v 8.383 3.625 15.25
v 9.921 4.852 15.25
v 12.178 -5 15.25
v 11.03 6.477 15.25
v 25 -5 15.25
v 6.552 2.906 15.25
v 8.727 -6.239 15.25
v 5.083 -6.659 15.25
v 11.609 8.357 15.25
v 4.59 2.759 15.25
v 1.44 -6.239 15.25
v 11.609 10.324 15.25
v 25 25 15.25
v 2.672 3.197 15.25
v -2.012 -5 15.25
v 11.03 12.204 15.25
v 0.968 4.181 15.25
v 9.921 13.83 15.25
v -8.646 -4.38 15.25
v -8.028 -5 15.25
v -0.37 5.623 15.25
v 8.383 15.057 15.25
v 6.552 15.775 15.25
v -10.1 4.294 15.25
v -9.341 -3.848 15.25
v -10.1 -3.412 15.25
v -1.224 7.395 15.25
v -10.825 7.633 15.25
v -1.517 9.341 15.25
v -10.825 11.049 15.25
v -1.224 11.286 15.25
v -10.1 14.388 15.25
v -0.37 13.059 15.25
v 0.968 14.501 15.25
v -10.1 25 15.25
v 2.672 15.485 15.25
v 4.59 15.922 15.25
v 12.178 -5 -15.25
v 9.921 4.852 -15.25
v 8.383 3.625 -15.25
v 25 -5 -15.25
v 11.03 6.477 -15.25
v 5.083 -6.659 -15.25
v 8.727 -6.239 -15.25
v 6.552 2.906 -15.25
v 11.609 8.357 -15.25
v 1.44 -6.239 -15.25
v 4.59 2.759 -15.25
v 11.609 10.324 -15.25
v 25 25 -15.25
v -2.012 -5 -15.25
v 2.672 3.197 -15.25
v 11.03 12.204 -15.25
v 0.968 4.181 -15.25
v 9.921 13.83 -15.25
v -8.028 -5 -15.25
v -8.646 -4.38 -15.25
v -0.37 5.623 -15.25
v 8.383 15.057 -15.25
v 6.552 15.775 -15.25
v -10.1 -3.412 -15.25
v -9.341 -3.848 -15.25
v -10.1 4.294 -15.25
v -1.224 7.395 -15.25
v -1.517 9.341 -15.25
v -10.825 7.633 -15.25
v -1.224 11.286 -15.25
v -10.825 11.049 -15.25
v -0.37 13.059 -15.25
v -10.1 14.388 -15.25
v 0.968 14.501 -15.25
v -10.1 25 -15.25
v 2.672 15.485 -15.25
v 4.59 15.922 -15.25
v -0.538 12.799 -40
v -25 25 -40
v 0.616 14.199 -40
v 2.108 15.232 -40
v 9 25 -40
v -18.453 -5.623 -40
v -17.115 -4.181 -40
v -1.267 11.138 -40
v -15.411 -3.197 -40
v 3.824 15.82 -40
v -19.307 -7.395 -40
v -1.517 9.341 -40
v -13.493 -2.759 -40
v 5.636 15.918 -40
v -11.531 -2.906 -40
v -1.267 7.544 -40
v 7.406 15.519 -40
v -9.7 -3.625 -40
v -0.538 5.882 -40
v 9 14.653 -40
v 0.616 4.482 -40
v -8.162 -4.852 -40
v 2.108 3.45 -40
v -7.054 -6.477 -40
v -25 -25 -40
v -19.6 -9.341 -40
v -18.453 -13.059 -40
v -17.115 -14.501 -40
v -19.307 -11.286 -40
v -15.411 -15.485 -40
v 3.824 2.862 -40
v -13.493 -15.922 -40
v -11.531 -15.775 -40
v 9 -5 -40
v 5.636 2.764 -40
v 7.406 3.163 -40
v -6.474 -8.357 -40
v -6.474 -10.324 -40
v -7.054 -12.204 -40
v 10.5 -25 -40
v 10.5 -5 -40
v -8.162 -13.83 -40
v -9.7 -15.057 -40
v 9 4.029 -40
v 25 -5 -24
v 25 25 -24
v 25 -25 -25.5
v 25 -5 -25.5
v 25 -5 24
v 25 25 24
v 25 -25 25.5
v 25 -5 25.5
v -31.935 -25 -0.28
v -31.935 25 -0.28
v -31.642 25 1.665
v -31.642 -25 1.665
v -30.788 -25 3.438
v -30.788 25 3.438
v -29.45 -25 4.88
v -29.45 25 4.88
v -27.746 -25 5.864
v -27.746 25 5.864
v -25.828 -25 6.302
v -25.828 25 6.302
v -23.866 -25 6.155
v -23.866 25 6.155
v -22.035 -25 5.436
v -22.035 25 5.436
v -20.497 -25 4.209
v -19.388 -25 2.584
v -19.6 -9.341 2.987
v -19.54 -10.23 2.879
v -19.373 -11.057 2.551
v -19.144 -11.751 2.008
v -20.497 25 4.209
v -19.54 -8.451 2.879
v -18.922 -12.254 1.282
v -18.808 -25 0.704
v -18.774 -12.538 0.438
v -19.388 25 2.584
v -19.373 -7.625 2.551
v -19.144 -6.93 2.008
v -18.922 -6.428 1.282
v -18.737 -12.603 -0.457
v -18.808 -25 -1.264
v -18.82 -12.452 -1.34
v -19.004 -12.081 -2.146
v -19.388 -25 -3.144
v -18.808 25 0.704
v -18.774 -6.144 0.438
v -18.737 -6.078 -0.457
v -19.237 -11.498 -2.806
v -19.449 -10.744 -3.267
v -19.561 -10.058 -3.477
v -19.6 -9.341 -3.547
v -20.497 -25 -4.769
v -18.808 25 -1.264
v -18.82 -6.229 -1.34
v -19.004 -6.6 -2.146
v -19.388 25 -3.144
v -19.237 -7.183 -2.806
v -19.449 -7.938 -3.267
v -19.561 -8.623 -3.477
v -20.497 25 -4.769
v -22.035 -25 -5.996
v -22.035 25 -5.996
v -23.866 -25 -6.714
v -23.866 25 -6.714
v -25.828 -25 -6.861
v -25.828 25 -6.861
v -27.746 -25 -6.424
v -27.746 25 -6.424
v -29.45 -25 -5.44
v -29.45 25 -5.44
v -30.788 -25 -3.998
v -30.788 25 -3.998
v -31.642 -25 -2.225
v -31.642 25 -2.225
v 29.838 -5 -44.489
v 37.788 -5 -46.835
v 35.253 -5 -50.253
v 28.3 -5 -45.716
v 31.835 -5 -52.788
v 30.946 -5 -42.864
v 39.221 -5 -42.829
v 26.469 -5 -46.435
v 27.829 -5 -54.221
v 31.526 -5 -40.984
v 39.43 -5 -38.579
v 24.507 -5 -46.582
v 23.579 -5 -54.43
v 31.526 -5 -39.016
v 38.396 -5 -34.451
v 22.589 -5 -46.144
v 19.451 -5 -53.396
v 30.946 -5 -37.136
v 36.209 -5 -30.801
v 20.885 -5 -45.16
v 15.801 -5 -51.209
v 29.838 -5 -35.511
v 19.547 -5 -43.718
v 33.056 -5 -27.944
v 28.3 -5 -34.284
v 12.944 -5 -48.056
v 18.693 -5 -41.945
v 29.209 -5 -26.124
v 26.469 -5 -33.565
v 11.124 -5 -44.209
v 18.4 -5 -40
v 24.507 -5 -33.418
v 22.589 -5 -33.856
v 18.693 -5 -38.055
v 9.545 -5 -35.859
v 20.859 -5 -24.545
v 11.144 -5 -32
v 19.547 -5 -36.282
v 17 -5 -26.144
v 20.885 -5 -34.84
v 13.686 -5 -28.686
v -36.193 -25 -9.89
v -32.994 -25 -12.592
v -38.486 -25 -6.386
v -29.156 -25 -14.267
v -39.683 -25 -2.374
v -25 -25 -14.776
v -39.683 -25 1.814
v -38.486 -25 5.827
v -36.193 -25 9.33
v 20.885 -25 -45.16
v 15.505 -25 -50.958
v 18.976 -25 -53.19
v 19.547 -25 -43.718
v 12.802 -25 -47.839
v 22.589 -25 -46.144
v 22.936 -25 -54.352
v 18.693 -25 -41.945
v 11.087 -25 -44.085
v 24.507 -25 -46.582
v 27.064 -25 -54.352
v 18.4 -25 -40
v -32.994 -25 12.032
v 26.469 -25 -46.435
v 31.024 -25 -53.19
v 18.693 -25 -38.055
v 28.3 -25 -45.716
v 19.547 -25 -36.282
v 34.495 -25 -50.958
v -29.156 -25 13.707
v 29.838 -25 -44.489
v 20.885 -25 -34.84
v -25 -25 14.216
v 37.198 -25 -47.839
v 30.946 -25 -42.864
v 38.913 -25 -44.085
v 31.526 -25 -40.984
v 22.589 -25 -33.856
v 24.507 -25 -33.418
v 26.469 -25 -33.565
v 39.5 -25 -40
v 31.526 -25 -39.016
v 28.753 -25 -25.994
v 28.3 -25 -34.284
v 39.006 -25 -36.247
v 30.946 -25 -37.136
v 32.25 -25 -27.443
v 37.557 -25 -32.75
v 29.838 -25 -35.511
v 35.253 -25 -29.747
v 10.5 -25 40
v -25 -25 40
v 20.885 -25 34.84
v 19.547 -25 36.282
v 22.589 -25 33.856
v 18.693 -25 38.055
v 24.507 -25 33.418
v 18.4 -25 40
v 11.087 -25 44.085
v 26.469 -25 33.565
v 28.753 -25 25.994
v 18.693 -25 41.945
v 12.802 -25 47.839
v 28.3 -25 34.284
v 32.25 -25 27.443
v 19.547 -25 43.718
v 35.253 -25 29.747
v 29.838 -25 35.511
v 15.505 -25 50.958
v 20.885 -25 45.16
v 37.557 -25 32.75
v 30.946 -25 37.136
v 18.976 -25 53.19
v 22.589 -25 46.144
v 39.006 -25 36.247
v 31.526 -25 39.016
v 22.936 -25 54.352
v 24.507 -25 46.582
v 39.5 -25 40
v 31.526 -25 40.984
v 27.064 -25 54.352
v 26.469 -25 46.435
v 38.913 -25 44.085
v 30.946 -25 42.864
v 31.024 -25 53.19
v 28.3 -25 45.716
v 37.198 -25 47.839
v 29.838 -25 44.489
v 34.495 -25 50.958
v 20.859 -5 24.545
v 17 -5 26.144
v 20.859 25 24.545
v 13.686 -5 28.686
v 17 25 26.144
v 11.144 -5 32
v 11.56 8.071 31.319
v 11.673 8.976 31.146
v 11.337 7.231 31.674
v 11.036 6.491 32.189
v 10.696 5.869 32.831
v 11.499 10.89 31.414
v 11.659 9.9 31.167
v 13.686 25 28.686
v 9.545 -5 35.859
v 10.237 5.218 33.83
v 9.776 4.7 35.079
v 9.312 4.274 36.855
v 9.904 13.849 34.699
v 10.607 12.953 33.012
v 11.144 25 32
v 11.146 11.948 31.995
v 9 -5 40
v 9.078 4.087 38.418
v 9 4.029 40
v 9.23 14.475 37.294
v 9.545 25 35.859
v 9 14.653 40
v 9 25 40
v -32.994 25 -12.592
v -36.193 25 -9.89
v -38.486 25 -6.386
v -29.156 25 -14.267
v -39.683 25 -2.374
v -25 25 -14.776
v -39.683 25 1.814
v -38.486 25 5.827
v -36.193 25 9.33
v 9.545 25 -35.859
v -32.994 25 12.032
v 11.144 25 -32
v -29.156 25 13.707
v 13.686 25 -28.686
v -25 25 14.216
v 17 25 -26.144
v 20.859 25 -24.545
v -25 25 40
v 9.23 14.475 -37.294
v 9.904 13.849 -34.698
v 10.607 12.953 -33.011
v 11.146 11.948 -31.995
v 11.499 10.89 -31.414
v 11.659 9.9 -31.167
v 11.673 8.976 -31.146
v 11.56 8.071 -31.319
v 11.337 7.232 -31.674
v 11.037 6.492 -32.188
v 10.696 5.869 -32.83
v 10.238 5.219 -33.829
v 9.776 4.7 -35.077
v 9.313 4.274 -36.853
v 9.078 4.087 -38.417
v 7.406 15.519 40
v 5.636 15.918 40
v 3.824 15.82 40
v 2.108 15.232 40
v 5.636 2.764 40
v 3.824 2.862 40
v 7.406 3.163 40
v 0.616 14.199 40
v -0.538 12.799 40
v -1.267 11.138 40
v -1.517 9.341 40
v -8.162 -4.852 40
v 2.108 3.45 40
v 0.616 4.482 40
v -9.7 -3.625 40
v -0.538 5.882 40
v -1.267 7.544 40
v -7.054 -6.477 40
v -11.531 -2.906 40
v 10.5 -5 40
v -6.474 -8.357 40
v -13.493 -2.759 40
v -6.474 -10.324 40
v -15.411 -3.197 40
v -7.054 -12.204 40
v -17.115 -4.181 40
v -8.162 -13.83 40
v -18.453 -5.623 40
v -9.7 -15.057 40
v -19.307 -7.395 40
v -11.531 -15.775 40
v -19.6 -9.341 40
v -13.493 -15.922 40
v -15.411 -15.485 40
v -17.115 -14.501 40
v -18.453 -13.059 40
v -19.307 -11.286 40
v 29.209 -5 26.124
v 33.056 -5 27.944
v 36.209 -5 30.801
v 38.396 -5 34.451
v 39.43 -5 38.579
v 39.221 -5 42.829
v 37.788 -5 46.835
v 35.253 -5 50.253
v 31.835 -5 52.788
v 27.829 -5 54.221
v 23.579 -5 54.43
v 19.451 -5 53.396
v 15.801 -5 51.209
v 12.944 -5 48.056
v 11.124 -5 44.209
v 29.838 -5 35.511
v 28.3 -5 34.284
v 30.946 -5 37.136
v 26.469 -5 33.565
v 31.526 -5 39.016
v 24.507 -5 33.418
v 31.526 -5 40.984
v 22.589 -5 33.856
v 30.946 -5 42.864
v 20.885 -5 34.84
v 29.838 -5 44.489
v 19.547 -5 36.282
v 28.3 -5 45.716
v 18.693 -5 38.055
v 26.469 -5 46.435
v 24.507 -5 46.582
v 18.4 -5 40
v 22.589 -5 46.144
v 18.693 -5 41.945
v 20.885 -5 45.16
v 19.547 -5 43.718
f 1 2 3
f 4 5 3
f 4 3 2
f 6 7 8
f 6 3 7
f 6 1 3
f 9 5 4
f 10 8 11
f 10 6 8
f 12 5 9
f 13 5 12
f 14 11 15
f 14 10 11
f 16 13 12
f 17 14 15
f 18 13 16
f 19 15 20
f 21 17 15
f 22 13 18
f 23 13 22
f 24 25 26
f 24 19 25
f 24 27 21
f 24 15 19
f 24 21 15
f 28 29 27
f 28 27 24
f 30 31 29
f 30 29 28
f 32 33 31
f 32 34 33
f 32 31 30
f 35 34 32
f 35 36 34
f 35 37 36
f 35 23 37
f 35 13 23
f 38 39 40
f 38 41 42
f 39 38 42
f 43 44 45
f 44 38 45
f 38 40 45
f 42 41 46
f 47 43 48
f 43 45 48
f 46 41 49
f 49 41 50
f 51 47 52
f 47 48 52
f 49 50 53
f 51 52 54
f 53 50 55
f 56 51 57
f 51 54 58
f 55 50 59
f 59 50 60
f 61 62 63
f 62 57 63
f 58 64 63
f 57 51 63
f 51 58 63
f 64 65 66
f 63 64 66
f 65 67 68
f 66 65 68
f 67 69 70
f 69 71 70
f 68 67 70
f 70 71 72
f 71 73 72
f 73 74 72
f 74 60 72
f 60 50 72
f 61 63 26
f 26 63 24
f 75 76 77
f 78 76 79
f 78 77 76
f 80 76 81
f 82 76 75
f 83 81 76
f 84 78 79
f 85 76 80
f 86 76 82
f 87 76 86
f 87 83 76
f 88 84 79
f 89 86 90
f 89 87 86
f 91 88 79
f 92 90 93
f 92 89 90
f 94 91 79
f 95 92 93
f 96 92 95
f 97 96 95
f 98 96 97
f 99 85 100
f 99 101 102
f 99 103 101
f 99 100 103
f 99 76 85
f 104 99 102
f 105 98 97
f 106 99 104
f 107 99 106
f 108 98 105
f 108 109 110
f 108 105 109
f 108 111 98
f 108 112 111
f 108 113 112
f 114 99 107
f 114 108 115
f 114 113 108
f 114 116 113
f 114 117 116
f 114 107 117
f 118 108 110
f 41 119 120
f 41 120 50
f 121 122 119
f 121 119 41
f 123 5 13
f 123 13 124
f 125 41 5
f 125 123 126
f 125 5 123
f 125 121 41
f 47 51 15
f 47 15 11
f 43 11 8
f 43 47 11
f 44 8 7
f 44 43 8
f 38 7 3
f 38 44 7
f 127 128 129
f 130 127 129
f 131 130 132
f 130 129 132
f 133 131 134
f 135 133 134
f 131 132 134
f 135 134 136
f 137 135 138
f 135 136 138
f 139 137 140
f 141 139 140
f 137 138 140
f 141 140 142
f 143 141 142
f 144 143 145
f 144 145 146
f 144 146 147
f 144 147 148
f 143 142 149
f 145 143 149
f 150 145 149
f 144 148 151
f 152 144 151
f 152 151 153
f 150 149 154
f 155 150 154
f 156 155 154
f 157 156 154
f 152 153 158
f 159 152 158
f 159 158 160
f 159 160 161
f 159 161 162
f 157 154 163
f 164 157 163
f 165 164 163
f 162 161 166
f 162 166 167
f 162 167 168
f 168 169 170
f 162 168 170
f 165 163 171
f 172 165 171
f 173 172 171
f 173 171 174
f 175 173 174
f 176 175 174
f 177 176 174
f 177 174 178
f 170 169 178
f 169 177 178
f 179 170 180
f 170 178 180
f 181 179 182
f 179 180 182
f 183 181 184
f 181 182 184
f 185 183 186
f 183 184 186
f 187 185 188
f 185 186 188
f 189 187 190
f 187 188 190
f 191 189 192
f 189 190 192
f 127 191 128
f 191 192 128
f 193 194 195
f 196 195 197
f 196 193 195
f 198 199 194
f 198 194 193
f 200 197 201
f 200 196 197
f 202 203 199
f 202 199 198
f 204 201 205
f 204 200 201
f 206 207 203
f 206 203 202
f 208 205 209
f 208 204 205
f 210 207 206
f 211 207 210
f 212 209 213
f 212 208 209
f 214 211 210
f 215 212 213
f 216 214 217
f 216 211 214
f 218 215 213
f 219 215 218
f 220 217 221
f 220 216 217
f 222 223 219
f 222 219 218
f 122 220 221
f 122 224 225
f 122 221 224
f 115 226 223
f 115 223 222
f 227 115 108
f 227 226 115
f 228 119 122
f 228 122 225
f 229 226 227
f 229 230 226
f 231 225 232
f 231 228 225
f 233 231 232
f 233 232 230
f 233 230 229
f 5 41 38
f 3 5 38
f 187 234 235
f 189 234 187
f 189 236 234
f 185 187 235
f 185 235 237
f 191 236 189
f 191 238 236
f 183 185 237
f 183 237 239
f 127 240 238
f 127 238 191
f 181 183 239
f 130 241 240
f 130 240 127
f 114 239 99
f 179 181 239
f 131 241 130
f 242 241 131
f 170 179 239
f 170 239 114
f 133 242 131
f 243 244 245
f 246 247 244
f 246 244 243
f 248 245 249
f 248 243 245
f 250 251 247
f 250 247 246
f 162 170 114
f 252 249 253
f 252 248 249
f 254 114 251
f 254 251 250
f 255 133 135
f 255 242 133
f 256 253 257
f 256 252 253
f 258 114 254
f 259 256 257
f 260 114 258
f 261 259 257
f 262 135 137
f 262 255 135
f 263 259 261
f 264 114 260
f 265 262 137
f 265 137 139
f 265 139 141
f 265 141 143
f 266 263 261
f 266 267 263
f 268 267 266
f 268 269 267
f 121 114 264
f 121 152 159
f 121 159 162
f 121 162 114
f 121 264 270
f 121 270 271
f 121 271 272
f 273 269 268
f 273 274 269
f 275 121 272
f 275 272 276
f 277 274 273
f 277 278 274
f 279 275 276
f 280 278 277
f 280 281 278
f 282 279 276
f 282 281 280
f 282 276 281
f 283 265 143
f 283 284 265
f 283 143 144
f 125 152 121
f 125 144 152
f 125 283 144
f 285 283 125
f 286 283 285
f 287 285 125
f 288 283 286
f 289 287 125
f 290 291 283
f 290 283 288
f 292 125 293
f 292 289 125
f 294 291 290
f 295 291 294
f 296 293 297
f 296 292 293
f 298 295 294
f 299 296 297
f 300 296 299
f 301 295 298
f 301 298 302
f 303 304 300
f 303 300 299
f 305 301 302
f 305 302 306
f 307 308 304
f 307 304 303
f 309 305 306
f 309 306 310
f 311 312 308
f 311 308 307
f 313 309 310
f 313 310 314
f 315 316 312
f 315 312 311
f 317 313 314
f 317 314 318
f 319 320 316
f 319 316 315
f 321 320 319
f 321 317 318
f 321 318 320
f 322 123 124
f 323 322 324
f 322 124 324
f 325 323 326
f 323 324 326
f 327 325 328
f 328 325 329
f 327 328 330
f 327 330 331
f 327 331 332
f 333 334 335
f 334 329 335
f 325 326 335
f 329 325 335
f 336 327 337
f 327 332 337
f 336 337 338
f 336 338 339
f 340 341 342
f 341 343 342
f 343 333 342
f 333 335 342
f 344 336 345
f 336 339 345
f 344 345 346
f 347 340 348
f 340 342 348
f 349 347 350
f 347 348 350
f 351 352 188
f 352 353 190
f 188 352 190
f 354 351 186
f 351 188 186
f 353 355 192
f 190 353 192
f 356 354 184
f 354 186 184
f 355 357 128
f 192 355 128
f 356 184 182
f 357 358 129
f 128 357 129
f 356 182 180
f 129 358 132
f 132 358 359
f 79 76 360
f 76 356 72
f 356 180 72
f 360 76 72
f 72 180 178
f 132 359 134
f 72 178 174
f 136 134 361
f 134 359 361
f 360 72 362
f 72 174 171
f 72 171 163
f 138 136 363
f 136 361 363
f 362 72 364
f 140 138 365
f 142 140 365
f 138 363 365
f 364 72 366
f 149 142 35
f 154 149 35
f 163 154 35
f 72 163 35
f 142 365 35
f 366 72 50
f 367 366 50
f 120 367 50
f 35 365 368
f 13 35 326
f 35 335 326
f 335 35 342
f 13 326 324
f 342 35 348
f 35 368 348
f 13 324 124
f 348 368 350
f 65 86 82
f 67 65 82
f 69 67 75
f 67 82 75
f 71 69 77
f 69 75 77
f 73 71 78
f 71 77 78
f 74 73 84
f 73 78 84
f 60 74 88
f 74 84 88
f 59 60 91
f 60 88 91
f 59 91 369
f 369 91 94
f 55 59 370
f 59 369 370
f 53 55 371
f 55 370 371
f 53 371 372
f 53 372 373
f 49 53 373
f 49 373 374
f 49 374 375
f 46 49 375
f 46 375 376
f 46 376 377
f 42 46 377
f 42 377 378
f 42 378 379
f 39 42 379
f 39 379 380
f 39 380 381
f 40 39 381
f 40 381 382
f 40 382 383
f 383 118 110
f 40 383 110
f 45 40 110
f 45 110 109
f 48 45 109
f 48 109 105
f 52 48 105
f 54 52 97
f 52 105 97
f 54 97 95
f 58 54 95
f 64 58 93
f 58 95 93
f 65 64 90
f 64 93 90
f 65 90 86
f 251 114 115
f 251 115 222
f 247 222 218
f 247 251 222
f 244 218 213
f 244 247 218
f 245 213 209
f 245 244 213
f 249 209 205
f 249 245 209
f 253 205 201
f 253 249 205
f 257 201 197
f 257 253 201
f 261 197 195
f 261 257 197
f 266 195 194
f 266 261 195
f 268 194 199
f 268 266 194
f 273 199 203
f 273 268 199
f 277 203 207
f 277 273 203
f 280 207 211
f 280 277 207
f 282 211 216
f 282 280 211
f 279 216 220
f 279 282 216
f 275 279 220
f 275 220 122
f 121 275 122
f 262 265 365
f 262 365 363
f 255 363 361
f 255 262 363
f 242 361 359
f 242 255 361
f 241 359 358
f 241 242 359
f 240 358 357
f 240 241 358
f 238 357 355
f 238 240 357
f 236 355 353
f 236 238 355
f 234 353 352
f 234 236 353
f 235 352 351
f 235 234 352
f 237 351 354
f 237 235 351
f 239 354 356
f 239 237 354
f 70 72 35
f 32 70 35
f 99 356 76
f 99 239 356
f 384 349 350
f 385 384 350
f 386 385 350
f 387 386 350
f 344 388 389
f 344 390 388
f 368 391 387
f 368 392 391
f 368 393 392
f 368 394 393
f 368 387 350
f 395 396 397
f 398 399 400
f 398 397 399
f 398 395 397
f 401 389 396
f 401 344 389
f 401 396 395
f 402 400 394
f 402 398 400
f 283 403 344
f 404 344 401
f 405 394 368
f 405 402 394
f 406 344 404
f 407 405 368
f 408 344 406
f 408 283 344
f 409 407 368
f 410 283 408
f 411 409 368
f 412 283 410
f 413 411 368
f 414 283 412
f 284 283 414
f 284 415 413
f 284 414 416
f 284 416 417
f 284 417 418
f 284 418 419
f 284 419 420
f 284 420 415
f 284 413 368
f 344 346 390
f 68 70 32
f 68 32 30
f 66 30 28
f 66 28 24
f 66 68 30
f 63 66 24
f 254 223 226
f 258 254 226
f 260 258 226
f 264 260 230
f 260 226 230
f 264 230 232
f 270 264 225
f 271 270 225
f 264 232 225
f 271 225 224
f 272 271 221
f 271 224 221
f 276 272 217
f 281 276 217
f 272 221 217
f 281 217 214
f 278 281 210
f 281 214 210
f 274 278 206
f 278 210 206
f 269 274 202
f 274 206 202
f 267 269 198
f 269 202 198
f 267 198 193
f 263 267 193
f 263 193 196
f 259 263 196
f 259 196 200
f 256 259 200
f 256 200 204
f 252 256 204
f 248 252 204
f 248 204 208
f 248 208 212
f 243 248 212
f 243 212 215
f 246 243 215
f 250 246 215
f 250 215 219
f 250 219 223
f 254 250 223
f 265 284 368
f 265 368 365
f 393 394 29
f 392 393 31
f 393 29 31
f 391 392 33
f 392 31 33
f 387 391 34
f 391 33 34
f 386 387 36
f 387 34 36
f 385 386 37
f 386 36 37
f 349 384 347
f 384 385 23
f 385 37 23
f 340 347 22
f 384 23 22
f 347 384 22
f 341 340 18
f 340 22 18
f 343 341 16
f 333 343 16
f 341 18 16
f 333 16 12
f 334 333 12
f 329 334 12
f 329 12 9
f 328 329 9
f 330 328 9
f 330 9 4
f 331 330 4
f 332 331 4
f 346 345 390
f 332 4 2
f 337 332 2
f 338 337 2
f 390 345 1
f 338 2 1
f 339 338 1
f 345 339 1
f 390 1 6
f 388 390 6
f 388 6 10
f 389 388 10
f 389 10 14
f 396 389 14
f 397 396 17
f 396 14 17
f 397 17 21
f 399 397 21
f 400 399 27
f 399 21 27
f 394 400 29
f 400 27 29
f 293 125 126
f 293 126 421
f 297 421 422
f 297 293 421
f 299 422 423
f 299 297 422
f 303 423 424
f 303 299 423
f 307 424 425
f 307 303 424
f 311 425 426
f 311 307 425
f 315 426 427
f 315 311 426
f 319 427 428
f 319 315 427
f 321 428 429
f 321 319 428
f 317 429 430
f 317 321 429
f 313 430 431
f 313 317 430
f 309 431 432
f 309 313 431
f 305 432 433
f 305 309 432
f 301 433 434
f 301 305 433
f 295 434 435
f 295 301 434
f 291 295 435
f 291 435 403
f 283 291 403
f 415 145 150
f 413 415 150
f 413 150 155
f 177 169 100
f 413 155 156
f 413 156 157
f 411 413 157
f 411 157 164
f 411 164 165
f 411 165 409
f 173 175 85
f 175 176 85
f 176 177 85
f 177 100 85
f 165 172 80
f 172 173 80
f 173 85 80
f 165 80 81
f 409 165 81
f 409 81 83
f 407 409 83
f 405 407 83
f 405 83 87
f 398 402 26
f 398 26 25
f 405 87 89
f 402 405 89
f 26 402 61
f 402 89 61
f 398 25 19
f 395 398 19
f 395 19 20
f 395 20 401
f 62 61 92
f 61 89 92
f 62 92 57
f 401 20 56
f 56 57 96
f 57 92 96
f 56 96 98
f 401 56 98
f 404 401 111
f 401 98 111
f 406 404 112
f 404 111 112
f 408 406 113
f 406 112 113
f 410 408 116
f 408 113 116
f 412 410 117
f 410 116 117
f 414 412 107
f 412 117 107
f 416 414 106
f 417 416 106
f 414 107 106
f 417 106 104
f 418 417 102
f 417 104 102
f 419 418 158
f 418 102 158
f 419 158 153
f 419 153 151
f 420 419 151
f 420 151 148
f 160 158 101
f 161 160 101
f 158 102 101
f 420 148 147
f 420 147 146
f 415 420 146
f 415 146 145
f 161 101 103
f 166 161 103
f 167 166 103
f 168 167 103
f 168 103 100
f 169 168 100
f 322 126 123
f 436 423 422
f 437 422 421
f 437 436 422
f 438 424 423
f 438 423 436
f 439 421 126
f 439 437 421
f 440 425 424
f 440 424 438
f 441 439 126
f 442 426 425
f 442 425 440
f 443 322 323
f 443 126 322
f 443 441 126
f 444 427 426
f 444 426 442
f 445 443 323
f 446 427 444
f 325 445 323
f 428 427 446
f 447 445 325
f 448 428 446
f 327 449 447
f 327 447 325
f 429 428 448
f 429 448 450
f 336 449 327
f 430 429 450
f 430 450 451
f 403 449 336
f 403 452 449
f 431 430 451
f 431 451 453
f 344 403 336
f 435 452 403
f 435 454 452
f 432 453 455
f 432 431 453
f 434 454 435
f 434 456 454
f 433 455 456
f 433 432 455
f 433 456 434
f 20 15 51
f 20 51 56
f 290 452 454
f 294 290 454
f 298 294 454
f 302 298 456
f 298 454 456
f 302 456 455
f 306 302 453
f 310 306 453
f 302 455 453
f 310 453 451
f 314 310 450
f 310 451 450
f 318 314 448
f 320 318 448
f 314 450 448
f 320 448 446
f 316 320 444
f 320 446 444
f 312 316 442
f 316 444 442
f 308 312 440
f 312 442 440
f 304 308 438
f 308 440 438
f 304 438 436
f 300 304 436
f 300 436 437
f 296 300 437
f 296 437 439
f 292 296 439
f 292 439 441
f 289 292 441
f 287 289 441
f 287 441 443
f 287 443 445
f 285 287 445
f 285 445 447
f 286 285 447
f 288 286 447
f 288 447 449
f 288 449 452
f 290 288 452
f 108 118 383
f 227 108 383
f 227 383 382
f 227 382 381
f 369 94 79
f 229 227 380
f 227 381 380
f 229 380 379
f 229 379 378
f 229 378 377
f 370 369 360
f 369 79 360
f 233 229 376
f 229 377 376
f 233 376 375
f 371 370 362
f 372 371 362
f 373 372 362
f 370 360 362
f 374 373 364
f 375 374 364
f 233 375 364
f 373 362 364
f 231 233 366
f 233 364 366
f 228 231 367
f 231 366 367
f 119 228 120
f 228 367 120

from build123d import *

# Parameters (mm, degrees)
F1_DEPTH       = 25
F3_D           = 13.2
F3_CBORE_D     = 19.25
F3_CBORE_DEPTH = 0
F5_D           = 13.2
F5_CBORE_D     = 19.25
F5_CBORE_DEPTH = 0
F6_W           = 40
F6_H           = 30.5
F7_DEPTH       = 30
F8_R           = 16
F9_DEPTH       = 30.5
F10_R          = 16
F11_DEPTH      = 30


with BuildPart() as f1:
    # F0 (on Front) → F1 (new body, symmetric)
    with BuildSketch(Plane.XZ):
        with BuildLine():
            Line((25, -25.5), (25, -40))
            Line((25, -40), (10.5, -40))
            ThreePointArc((10.5, -40), (25, -54.5), (39.5, -40))
            ThreePointArc((39.5, -40), (35.2530483272, -29.7469516728), (25, -25.5))
        make_face()
        with BuildLine():
            Line((10.5, -40), (25, -40))
            Line((25, -40), (25, -25.5))
            ThreePointArc((25, -25.5), (14.7469516728, -29.7469516728), (10.5, -40))
        make_face()
        with BuildLine():
            Line((-25, -40), (10.5, -40))
            ThreePointArc((10.5, -40), (14.7469516728, -29.7469516728), (25, -25.5))
            Line((25, -25.5), (25, 25.5))
            ThreePointArc((25, 25.5), (14.7469516728, 29.7469516728), (10.5, 40))
            Line((10.5, 40), (-25, 40))
            Line((-25, 40), (-25, 14.2162181315))
            ThreePointArc((-25, 14.2162181315), (-14.9640357801, 9.8540823977), (-10.8347666082, -0.279916916))
            ThreePointArc((-10.8347666082, -0.279916916), (-14.9640357801, -10.4139162298), (-25, -14.7760519636))
            Line((-25, -14.7760519636), (-25, -40))
        make_face()
        with BuildLine():
            ThreePointArc((10.5, 40), (14.7469516728, 29.7469516728), (25, 25.5))
            Line((25, 25.5), (25, 40))
            Line((25, 40), (10.5, 40))
        make_face()
        with BuildLine():
            Line((25, 40), (25, 25.5))
            ThreePointArc((25, 25.5), (35.2530483272, 29.7469516728), (39.5, 40))
            ThreePointArc((39.5, 40), (25, 54.5), (10.5, 40))
            Line((10.5, 40), (25, 40))
        make_face()
        with BuildLine():
            ThreePointArc((-25, 14.2162181315), (-39.8347666082, -0.279916916), (-25, -14.7760519636))
            Line((-25, -14.7760519636), (-25, 14.2162181315))
        make_face()
        with BuildLine():
            Line((-25, 14.2162181315), (-25, -14.7760519636))
            ThreePointArc((-25, -14.7760519636), (-14.9640357801, -10.4139162298), (-10.8347666082, -0.279916916))
            ThreePointArc((-10.8347666082, -0.279916916), (-14.9640357801, 9.8540823977), (-25, 14.2162181315))
        make_face()
    extrude(amount=F1_DEPTH, both=True)

    # F3 (through all)
    with Locations(Plane.XZ.offset(25)):
        with Locations((25, 40), (-25.3347666082, -0.279916916), (25, -40)):
            CounterBoreHole(F3_D / 2, F3_CBORE_D / 2, F3_CBORE_DEPTH)

    # F5 (through all)
    with Locations(Plane.XY.offset(40)):
        with Locations((-13, -9.3407420599), (5.0832007976, 9.3407420599)):
            CounterBoreHole(F5_D / 2, F5_CBORE_D / 2, F5_CBORE_DEPTH)

    # F6 (on face) → F7 (cut)
    with BuildSketch(Plane(origin=(0, 25, 0), x_dir=(-1, 0, 0), z_dir=(0, 1, 0))):
        with Locations((-9.9, 0)):
            Rectangle(F6_W, F6_H)
    extrude(amount=-F7_DEPTH, mode=Mode.SUBTRACT)

    # F8 (on face) → F9 (cut)
    with BuildSketch(Plane.XY.offset(-15.25)):
        with Locations((5.0832007976, 9.3407420599)):
            Circle(F8_R)
    extrude(amount=F9_DEPTH, mode=Mode.SUBTRACT)

    # F10 (on face) → F11 (cut)
    with BuildSketch(Plane(origin=(0, 25, 0), x_dir=(-1, 0, 0), z_dir=(0, 1, 0))):
        with Locations((-25, 40)):
            Circle(F10_R)
        with Locations((-25, -40)):
            Circle(F10_R)
    extrude(amount=-F11_DEPTH, mode=Mode.SUBTRACT)


solid = f1.part
